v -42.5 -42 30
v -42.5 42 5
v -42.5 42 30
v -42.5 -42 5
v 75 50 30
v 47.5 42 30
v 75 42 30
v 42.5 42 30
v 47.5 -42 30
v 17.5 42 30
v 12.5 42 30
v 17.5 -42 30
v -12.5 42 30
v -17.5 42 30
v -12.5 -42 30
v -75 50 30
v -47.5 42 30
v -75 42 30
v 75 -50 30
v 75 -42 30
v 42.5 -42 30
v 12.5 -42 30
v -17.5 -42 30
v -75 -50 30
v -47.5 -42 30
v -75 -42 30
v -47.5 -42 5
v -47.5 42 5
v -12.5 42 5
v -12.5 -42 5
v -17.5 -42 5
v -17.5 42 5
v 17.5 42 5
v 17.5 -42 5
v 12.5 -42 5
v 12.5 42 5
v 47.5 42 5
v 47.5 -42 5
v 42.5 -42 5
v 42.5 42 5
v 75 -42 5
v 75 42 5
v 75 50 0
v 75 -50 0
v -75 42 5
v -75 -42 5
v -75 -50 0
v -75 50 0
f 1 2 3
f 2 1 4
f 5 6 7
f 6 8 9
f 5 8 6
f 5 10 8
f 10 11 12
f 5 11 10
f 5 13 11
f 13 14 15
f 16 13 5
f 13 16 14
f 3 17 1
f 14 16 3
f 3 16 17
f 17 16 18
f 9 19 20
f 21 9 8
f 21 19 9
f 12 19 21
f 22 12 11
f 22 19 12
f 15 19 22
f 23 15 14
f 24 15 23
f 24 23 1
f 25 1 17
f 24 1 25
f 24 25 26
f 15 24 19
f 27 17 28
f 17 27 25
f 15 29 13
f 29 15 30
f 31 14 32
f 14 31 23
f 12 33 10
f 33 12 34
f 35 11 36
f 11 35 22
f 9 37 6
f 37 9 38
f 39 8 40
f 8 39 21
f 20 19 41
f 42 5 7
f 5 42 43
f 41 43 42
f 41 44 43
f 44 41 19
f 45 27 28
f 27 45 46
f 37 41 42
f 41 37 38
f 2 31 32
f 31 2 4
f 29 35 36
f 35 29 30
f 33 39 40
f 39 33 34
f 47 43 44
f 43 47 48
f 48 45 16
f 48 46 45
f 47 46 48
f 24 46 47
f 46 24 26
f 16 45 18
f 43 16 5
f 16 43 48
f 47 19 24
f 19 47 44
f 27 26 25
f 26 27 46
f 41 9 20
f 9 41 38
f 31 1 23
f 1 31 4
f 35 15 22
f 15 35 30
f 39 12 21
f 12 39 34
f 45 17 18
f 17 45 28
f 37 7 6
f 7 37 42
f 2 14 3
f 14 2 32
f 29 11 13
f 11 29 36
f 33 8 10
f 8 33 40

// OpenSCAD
$fn = 32;

// ----------------------------------------------------------------------
// Rib frame 150 x 100 x 30
// 4 ribs at 30 mm pitch
// ----------------------------------------------------------------------

// --- parameters (mm) ---
frame = [150, 100, 5];  // base plate size (x, y, z)
rail_w = 8;             // side rail width
ribs = 4;               // number of ribs
rib_t = 5;              // rib thickness
rib_h = 25;             // rib height above the base plate
pitch = 30;             // pitch between rib centres

// --- derived feature positions (mm) ---
span = (ribs - 1) * pitch;          // = 90   distance between the outer ribs
origin_x = -span / 2;               // = -45   X of the first rib
rib_len = frame[1] - 2 * rail_w + 2;  // = 86   rib length, 1 mm into each rail
feature_centers = [
  [origin_x + 0 * pitch, 0],
  [origin_x + 1 * pitch, 0],
  [origin_x + 2 * pitch, 0],
  [origin_x + 3 * pitch, 0]
];   // rib centre line, drives the rib loop

// base plate, two side rails, then the ribs read straight off feature_centers
union() {
  translate([-frame[0] / 2, -frame[1] / 2, 0]) cube(frame);
  translate([-frame[0] / 2, -frame[1] / 2, 0]) cube([frame[0], rail_w, frame[2] + rib_h]);
  translate([-frame[0] / 2, frame[1] / 2 - rail_w, 0]) cube([frame[0], rail_w, frame[2] + rib_h]);
  for (centre = feature_centers)
    translate([centre[0] - rib_t / 2, centre[1] - rib_len / 2, frame[2] - 1])
      cube([rib_t, rib_len, rib_h + 1]);
}
